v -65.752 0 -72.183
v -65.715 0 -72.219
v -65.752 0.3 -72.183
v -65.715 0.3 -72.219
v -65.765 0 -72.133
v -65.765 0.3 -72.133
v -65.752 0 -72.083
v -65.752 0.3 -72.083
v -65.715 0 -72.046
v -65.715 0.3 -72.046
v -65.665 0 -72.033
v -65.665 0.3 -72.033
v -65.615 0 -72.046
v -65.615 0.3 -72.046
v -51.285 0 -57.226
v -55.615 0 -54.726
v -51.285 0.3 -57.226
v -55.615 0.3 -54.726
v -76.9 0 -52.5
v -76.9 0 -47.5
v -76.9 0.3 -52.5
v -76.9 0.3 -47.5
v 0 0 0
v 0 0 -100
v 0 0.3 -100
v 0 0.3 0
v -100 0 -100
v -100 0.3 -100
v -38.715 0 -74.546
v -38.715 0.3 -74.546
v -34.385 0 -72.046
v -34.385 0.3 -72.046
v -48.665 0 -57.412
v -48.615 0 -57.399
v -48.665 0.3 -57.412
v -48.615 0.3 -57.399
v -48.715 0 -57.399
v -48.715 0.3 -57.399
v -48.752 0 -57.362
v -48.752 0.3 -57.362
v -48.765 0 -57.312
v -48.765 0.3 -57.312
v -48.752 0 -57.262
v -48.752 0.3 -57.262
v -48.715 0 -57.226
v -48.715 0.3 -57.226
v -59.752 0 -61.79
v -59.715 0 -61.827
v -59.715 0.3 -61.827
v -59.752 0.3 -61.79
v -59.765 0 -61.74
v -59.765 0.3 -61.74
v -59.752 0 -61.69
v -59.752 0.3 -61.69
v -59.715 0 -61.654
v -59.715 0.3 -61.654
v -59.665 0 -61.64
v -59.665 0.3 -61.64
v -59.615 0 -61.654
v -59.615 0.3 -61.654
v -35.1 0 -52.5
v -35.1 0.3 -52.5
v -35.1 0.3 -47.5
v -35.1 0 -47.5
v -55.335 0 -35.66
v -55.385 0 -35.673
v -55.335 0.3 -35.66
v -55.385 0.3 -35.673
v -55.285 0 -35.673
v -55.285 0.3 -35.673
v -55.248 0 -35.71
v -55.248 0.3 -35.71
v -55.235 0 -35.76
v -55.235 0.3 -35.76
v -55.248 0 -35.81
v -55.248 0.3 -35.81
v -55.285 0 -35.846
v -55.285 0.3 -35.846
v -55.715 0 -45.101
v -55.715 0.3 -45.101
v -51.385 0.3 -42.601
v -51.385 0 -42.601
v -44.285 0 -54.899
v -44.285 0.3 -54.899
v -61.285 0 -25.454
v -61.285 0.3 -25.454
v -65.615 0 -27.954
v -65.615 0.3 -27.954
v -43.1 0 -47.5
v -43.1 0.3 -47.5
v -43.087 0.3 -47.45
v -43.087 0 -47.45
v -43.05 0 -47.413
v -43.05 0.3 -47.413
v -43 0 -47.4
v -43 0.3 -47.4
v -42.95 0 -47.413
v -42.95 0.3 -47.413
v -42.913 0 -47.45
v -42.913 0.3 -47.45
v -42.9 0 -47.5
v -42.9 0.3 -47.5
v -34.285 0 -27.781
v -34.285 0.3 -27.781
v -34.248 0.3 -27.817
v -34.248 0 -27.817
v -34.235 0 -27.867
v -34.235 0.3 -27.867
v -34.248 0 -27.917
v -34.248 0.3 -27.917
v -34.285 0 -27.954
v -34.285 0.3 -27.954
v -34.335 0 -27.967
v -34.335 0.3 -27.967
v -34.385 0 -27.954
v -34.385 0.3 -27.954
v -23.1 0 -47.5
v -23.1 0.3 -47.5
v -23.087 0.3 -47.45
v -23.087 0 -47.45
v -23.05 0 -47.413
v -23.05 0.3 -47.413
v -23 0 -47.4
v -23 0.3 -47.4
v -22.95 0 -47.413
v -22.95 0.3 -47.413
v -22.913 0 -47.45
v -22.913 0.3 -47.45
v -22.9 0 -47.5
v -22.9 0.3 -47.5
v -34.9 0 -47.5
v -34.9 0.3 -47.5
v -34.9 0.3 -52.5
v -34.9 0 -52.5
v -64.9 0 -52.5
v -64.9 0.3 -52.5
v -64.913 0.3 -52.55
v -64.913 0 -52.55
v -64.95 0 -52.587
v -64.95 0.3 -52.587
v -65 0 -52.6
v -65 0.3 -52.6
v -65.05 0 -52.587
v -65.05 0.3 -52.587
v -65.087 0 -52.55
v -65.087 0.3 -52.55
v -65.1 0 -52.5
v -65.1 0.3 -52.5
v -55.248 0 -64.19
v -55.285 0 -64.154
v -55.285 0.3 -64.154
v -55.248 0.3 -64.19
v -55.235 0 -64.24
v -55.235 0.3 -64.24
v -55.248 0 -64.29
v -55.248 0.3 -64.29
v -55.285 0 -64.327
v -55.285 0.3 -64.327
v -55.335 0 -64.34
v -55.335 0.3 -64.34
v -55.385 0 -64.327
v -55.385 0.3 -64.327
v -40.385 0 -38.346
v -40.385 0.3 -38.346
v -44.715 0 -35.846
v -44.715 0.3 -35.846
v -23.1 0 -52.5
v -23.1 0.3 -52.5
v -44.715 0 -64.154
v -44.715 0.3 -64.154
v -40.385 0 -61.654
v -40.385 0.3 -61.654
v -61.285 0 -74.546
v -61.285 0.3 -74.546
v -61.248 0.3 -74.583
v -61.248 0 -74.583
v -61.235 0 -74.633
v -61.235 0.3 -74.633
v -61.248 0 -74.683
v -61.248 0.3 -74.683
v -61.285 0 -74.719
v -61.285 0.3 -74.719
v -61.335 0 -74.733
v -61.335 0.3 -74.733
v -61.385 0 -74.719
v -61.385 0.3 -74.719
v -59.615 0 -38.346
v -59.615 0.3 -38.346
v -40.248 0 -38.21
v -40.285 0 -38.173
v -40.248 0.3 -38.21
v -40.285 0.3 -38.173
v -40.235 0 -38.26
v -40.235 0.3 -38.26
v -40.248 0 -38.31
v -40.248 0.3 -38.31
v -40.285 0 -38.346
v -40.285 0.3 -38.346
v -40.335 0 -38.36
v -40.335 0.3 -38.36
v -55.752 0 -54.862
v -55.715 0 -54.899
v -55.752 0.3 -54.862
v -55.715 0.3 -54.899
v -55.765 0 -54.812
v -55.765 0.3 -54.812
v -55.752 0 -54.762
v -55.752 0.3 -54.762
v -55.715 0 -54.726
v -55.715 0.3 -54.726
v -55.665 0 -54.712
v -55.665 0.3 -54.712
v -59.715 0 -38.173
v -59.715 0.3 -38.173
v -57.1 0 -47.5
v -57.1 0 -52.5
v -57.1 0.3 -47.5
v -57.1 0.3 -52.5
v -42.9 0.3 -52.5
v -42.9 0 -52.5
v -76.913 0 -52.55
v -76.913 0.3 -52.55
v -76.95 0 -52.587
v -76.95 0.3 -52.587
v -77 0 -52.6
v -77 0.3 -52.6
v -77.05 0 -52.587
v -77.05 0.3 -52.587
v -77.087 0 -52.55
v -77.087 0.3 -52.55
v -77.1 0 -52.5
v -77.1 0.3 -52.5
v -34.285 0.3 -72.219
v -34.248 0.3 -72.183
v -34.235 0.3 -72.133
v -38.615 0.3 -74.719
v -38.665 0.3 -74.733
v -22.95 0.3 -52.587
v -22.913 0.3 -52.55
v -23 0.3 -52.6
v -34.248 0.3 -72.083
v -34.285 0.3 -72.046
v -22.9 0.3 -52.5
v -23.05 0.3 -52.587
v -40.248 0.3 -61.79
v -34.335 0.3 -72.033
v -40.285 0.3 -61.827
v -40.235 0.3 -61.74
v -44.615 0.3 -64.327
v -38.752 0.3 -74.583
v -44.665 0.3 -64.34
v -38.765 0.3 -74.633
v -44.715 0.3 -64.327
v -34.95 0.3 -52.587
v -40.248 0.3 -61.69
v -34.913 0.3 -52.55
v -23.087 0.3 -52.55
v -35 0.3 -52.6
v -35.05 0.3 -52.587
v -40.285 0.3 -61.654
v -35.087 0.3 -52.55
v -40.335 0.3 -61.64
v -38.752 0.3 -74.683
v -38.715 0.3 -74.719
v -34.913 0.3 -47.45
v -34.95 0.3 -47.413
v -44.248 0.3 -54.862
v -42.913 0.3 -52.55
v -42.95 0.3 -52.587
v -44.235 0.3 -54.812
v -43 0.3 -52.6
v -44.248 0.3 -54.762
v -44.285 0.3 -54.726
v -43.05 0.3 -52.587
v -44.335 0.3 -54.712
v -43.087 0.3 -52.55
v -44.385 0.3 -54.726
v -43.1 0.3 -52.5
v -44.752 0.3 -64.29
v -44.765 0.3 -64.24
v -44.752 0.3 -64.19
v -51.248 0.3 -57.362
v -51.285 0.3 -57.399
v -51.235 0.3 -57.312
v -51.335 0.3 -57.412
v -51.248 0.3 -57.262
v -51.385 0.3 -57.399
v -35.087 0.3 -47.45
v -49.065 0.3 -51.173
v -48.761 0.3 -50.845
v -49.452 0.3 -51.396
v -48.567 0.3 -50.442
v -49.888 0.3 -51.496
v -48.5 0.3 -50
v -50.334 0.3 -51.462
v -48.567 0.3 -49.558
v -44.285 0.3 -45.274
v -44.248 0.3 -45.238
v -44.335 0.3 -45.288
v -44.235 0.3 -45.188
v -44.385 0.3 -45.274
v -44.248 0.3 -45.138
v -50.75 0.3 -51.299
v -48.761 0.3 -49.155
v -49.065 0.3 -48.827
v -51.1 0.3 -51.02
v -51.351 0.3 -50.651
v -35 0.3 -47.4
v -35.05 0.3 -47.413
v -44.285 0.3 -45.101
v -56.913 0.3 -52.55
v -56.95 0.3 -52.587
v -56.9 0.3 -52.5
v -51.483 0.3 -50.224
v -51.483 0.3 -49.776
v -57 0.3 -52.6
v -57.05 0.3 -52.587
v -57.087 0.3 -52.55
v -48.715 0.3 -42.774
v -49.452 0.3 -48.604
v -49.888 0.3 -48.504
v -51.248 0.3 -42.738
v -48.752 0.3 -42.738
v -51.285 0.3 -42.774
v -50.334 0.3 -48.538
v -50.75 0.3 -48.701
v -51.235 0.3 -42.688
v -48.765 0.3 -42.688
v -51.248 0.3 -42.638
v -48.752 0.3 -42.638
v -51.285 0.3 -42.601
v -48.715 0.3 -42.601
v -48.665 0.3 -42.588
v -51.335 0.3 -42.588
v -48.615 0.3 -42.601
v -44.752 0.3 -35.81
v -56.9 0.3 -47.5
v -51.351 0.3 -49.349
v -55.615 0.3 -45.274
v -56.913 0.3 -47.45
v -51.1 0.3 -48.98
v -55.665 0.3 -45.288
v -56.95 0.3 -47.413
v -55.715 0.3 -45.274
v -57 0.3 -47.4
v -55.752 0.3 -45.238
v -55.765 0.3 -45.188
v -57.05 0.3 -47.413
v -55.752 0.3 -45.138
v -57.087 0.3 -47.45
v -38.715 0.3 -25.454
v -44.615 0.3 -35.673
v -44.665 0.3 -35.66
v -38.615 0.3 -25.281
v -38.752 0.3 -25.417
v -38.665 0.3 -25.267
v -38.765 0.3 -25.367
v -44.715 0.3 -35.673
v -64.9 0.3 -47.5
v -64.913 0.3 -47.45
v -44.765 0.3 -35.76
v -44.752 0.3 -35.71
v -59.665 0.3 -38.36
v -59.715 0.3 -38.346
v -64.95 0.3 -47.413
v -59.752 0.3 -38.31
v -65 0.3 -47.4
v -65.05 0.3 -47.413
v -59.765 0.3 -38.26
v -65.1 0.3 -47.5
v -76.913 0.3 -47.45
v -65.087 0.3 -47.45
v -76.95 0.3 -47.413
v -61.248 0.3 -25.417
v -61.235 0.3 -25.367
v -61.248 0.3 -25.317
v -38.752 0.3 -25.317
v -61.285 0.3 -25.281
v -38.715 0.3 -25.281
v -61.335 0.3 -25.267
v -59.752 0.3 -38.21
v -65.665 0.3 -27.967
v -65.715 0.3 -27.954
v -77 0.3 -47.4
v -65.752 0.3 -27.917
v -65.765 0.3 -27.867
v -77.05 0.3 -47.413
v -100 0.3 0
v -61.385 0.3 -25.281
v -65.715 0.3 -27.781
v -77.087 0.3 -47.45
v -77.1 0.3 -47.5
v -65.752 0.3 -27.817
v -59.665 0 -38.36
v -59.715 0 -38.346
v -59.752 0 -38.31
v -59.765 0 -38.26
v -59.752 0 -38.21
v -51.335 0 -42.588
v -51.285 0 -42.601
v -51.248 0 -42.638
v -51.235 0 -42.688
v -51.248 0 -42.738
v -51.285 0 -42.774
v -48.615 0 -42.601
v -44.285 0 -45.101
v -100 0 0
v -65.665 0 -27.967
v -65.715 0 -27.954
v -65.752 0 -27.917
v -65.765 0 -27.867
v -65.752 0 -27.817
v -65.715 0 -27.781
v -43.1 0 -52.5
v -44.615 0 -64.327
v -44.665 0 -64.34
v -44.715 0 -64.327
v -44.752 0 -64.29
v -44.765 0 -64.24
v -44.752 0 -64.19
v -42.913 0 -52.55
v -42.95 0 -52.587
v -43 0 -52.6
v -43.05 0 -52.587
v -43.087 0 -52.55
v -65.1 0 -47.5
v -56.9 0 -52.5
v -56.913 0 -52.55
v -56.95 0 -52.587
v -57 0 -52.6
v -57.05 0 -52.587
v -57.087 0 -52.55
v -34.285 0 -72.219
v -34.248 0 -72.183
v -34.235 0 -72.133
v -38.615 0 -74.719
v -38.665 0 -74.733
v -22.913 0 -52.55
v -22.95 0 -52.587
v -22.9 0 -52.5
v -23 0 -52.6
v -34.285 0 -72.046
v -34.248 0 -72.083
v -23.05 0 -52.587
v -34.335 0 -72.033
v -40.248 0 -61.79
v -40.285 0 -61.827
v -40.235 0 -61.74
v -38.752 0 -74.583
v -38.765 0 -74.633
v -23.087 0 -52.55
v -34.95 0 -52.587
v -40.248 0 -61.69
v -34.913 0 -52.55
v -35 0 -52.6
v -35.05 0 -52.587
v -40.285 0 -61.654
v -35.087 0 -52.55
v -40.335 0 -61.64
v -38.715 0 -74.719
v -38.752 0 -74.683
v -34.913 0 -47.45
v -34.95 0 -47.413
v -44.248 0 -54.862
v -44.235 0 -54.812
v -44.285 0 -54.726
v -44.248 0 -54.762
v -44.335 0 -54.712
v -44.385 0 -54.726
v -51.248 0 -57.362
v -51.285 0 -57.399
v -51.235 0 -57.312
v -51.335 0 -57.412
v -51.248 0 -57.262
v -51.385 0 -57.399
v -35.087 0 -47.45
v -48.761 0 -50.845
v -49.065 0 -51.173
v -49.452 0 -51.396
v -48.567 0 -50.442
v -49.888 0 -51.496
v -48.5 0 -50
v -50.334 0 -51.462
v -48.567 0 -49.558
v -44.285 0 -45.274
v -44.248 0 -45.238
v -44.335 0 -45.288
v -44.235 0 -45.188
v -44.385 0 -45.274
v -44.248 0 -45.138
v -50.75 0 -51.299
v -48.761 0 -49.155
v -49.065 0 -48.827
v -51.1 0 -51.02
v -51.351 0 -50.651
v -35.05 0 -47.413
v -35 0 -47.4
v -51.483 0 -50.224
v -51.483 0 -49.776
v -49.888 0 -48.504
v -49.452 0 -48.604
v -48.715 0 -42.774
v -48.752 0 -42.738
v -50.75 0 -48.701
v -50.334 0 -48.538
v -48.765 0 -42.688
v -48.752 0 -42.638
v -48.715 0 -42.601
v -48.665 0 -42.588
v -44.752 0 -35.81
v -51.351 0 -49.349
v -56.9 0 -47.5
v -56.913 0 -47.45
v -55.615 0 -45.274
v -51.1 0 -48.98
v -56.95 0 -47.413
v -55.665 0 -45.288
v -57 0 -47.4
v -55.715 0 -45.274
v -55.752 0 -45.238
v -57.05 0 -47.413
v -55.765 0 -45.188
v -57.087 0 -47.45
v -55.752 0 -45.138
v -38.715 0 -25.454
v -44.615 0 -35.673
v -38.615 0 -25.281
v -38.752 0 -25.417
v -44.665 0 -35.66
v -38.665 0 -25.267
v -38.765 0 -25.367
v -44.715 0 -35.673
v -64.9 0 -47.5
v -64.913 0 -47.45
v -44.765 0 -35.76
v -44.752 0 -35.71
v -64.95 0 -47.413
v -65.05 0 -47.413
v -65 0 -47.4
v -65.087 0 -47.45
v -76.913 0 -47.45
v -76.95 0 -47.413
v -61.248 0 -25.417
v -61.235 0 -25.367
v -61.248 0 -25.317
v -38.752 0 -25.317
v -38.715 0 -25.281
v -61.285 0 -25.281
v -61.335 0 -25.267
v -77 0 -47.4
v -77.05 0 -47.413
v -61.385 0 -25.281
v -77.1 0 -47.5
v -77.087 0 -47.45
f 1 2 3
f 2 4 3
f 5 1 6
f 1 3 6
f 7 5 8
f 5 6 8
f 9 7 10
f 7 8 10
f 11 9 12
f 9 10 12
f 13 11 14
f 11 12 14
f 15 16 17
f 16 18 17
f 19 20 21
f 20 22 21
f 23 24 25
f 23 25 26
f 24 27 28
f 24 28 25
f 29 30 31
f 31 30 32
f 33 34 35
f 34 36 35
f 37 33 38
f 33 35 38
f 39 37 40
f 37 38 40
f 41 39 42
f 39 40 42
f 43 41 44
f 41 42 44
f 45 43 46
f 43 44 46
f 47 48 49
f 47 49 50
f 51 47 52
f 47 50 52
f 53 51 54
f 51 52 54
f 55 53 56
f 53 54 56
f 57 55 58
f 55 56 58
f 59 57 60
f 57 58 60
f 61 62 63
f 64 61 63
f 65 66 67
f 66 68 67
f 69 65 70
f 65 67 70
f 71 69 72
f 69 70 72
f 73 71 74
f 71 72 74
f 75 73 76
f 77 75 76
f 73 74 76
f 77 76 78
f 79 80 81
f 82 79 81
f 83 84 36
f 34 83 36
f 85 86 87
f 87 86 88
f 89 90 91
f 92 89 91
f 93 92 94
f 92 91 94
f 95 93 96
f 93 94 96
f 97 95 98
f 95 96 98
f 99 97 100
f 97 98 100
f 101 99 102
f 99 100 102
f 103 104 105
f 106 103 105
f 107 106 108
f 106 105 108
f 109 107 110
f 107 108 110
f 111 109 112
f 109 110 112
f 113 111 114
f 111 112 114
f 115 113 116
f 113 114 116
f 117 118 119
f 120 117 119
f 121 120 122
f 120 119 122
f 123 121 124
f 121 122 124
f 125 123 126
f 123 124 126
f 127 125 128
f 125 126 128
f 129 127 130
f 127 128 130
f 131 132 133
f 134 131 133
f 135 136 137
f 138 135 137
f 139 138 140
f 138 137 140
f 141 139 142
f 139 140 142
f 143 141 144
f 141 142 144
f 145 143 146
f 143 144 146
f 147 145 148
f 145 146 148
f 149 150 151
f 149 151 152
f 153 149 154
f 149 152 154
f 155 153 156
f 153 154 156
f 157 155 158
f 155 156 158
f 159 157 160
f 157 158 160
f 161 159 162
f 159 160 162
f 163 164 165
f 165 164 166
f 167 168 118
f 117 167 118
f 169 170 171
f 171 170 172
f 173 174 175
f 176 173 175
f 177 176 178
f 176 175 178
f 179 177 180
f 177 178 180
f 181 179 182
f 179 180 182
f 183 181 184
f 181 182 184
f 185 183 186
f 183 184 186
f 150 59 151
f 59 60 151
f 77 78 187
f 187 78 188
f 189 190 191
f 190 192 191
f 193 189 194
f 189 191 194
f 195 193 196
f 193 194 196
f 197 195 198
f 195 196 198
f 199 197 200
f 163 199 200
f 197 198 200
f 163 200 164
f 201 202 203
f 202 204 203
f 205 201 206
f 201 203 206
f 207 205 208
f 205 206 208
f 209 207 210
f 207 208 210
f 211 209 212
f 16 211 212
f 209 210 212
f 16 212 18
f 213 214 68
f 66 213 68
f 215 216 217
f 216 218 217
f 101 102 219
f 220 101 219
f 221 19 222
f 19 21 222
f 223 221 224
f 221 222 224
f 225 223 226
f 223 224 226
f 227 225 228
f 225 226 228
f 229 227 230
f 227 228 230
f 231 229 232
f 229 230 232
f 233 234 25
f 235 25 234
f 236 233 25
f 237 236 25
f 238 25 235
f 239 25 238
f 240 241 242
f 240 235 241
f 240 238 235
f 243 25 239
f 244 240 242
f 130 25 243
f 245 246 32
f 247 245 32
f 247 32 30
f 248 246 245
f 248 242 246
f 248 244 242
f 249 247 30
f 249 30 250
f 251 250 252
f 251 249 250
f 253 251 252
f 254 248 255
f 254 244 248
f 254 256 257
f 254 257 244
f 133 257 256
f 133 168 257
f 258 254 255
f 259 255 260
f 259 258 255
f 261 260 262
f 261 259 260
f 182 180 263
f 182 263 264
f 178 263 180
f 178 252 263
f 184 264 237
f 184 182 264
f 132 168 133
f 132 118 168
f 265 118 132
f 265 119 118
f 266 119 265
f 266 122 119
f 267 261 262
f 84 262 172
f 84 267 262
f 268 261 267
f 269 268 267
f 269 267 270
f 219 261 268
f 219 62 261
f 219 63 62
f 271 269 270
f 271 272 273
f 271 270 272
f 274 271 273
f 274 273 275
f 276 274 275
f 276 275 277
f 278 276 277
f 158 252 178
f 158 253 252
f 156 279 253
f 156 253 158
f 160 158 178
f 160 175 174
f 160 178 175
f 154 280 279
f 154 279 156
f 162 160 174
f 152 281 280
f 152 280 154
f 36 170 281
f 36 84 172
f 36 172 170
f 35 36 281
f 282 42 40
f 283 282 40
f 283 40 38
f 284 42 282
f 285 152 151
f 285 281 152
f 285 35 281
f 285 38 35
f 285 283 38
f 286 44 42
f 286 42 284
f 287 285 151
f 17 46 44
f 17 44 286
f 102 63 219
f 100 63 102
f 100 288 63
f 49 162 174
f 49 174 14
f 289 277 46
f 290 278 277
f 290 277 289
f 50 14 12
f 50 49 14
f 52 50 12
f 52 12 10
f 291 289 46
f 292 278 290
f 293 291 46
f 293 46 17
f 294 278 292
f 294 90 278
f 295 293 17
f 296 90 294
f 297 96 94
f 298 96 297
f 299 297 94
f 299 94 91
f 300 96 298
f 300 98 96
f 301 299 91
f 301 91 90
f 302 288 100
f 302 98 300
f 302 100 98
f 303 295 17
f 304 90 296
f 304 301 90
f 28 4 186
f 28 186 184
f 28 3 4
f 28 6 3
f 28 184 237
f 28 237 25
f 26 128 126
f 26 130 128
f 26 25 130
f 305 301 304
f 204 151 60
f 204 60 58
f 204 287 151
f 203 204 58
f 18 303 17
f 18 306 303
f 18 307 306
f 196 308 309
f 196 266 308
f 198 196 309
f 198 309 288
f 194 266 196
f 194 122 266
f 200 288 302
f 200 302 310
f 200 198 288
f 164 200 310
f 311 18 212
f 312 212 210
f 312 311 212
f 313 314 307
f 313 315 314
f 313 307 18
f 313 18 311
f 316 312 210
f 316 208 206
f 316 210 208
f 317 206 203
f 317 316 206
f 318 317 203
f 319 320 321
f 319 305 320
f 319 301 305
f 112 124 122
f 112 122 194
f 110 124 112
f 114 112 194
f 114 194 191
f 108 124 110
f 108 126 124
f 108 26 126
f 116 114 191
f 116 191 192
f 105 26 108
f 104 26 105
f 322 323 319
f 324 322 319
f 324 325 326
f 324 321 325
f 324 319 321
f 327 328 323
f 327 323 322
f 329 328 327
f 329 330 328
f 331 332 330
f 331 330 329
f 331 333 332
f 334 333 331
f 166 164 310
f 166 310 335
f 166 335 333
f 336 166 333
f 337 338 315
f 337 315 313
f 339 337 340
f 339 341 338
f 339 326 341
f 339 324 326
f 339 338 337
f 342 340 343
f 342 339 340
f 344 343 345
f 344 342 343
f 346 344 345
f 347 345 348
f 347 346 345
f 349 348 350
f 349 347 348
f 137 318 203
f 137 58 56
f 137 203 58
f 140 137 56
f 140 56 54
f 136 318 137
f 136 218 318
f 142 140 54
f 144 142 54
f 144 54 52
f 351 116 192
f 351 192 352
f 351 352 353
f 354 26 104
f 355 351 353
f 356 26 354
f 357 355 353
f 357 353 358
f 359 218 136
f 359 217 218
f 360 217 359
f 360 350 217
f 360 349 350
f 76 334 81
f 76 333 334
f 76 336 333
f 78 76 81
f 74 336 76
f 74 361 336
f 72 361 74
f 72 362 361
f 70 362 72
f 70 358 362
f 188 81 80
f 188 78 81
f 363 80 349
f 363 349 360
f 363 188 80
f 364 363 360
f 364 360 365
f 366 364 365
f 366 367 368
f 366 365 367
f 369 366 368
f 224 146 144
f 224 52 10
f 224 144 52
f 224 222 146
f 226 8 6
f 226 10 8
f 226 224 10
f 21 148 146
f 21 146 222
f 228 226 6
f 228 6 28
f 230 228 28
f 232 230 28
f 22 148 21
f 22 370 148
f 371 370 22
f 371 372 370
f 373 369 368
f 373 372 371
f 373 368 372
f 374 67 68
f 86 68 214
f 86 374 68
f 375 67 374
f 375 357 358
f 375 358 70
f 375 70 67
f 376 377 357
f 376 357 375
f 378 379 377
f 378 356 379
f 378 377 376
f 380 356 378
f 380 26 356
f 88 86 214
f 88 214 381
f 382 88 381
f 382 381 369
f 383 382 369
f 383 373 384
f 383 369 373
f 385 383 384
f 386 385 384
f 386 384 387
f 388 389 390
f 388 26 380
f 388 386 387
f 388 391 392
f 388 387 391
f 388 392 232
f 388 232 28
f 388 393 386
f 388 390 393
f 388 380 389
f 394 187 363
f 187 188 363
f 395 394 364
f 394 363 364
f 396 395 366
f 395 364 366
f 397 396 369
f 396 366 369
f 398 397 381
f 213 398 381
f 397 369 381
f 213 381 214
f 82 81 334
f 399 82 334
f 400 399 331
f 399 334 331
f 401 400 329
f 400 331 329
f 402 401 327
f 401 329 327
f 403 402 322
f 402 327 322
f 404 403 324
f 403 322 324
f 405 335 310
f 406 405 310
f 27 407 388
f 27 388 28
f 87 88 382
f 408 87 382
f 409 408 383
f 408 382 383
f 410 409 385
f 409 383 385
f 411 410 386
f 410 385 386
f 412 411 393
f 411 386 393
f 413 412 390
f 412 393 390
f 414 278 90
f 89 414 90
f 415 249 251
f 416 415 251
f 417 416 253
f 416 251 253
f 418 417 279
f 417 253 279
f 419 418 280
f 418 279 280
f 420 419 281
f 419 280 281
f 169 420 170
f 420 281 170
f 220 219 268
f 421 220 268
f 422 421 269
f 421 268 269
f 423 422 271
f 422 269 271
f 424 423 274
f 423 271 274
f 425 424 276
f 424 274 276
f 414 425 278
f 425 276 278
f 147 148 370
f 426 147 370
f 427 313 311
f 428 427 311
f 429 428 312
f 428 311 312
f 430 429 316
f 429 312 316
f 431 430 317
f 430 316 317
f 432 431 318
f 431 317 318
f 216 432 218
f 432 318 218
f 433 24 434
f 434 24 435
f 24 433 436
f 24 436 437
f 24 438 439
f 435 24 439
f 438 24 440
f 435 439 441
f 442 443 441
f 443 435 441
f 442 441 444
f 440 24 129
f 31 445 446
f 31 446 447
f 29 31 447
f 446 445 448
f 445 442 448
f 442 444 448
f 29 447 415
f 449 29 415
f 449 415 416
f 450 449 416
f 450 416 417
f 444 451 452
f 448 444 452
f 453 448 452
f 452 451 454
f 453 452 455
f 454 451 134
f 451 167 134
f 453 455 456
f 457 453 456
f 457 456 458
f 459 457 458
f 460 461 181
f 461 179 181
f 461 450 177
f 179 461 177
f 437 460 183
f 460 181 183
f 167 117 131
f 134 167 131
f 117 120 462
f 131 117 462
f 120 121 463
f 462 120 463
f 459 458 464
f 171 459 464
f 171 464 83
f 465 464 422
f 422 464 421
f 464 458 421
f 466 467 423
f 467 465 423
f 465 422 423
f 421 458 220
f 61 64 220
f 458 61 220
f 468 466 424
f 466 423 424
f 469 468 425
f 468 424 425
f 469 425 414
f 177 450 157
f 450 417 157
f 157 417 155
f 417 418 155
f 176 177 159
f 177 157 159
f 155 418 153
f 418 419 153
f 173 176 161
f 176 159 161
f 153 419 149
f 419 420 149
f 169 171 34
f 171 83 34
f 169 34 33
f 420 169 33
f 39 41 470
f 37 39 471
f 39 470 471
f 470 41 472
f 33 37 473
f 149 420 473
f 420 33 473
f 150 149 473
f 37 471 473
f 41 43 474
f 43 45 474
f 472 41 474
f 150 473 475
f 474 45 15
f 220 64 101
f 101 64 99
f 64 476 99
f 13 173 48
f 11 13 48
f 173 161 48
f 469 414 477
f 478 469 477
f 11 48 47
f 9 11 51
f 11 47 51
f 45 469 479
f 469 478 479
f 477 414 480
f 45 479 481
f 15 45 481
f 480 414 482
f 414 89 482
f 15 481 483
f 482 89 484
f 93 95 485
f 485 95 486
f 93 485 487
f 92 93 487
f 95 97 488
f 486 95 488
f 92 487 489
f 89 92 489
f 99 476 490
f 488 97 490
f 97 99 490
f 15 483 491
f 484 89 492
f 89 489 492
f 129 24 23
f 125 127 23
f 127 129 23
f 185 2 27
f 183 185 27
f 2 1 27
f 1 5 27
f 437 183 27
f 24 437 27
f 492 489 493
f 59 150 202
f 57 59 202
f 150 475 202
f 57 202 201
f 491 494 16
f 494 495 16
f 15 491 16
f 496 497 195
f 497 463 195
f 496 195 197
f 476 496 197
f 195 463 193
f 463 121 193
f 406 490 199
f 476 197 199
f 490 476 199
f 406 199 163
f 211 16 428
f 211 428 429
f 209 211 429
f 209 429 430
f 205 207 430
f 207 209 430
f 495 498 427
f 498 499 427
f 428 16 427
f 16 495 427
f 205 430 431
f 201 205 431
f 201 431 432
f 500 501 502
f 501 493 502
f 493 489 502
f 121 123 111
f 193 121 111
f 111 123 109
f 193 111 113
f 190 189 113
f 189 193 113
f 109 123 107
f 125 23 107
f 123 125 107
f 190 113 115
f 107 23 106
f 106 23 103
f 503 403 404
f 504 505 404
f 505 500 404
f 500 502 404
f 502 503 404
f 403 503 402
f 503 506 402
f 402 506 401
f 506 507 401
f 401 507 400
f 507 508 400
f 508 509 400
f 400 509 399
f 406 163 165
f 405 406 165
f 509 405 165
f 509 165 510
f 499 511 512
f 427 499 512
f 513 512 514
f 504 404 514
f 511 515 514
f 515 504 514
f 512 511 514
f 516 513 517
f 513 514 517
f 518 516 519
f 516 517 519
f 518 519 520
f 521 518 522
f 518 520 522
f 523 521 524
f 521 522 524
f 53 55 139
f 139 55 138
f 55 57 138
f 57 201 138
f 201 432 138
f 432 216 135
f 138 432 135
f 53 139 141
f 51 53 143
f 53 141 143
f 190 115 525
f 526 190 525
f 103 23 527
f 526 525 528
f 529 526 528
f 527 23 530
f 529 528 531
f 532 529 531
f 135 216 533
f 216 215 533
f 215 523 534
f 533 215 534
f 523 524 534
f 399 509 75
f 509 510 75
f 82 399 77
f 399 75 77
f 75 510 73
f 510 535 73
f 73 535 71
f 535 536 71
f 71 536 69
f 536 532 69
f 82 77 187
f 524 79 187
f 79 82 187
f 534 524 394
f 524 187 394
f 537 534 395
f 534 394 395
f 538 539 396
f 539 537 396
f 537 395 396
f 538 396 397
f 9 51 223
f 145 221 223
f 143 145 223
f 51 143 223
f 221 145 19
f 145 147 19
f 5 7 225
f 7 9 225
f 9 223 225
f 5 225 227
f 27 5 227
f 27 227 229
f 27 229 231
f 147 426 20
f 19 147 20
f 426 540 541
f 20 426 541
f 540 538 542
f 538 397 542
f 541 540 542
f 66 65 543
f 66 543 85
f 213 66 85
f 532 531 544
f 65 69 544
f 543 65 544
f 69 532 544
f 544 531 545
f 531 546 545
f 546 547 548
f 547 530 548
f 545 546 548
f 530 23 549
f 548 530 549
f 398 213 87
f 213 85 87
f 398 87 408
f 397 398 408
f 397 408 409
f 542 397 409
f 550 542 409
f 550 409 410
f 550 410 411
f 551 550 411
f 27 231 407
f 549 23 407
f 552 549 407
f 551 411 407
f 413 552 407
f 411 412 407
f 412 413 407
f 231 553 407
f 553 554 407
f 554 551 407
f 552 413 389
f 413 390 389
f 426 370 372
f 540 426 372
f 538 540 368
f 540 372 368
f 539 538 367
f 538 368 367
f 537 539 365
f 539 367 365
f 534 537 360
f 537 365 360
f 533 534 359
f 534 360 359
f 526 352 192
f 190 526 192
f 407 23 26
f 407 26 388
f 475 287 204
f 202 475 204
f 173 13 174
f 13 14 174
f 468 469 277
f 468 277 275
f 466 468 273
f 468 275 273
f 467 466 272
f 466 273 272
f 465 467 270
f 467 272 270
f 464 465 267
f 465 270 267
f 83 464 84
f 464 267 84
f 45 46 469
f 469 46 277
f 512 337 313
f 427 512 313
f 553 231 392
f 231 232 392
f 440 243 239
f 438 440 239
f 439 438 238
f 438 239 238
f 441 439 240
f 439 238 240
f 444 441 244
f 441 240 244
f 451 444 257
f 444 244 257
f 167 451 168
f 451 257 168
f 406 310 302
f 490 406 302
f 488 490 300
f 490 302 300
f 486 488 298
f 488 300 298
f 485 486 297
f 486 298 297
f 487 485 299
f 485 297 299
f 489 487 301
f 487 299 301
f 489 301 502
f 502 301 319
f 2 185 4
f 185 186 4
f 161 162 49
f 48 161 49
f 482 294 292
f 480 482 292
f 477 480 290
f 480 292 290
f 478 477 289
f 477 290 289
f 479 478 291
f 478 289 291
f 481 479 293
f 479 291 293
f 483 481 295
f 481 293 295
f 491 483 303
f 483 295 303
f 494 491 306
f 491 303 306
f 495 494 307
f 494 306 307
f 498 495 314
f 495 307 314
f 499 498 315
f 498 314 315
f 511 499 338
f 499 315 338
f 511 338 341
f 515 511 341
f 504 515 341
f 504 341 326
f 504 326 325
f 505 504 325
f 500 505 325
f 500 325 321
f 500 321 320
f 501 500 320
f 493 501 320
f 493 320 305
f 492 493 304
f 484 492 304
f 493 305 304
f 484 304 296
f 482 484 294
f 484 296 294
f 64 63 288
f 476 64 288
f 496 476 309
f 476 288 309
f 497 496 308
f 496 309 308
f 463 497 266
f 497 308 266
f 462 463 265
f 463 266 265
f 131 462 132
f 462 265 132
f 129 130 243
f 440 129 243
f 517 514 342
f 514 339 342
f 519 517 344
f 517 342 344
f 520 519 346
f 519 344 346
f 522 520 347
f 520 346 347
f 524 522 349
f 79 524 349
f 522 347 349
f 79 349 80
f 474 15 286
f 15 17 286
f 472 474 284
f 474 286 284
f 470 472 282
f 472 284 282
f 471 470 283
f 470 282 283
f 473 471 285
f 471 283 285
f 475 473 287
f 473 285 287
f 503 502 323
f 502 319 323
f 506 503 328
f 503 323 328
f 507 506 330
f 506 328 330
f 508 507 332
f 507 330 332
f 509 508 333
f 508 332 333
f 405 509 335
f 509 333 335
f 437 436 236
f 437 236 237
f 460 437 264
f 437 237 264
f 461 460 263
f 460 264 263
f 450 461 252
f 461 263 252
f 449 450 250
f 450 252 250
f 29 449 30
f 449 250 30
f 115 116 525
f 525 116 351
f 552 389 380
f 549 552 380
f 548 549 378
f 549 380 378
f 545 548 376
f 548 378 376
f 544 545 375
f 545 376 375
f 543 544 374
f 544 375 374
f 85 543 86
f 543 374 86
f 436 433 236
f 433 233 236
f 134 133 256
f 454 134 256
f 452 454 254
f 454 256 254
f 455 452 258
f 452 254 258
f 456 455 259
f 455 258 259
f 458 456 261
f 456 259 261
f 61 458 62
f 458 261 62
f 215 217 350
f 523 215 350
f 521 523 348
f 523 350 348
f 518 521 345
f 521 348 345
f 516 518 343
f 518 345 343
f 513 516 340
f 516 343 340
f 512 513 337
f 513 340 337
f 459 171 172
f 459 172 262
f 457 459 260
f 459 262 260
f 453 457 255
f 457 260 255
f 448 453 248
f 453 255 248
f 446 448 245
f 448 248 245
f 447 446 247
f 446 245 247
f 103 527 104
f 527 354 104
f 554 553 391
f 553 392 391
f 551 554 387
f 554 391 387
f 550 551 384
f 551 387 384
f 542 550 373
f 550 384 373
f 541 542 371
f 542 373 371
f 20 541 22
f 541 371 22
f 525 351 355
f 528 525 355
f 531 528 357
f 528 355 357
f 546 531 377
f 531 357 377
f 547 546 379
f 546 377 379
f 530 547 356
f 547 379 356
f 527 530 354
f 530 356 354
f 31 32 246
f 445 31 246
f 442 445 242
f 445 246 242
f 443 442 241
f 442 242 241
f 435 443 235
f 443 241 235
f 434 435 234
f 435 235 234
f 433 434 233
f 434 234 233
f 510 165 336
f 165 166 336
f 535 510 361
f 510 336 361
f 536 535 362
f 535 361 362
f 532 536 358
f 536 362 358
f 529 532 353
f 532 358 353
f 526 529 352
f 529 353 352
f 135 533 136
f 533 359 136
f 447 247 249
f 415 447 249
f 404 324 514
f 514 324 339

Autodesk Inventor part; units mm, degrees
ref_plane "YZ Plane" through (0, 0, 0) normal (1, 0, 0) x (0, 1, 0)
ref_plane "XZ Plane" through (0, 0, 0) normal (0, 1, 0) x (-1, 0, 0)
ref_plane "XY Plane" through (0, 0, 0) normal (0, 0, 1) x (1, 0, 0)
sketch "Sketch1" plane through (0, 0, 0) normal (0, 1, 0) x (-1, 0, 0)
  line L0 (0, 0) -> (100, 0)
  line L1 (100, 0) -> (100, -100)
  line L2 (100, -100) -> (0, -100)
  line L3 (0, -100) -> (0, 0)
  dimension "d0" = 100
  dimension "d1" = 100
extrude "Extrusion1" add sketch "Sketch1" along normal blind 0.3
sketch "Sketch2" plane through (0, 0.3, 0) normal (0, 1, 0) x (1, 0, 0)
  line L0 (-100, 100) -> (-100, 0) projected
  line L1 (-100, 0) -> (0, 0) projected
  line L2 (0, 0) -> (0, 100) projected
  line L3 (0, 100) -> (-100, 100) projected
  line L4 (0, 0) -> (0, 50)
  line L5 (0, 0) -> (0, 100) projected
  line L6 (0, 50) -> (-50, 50)
  circle A0 centre (-50, 50) radius 1.5
  dimension "d4" = 50
  dimension "d5" = 3
extrude "Extrusion2" cut sketch "Sketch2" against normal blind 0.3 contours A0
sketch "Sketch3" plane through (0, 0.3, 0) normal (0, 1, 0) x (1, 0, 0)
  circle A0 centre (-50, 50) radius 1.5 projected
  line L0 (-100, 100) -> (-100, 0) projected
  line L1 (-100, 0) -> (0, 0) projected
  line L2 (0, 0) -> (0, 100) projected
  line L3 (0, 100) -> (-100, 100) projected
  line L4 (-50, 50) -> (-57, 50)
  line L5 (-57, 47.5) -> (-57, 52.5) construction
  line L6 (-56.9, 47.5) -> (-56.9, 52.5)
  line L7 (-57.1, 52.5) -> (-57.1, 47.5)
  arc A1 (-57.1, 47.5) -> (-56.9, 47.5) centre (-57, 47.5) ccw
  arc A2 (-56.9, 52.5) -> (-57.1, 52.5) centre (-57, 52.5) ccw
  line L8 (-57, 50) -> (-65, 50)
  line L9 (-65, 47.5) -> (-65, 52.5) construction
  line L10 (-64.9, 47.5) -> (-64.9, 52.5)
  line L11 (-65.1, 52.5) -> (-65.1, 47.5)
  arc A3 (-65.1, 47.5) -> (-64.9, 47.5) centre (-65, 47.5) ccw
  arc A4 (-64.9, 52.5) -> (-65.1, 52.5) centre (-65, 52.5) ccw
  line L12 (-65, 50) -> (-77, 50)
  line L13 (-77, 47.5) -> (-77, 52.5) construction
  line L14 (-76.9, 47.5) -> (-76.9, 52.5)
  line L15 (-77.1, 52.5) -> (-77.1, 47.5)
  arc A5 (-77.1, 47.5) -> (-76.9, 47.5) centre (-77, 47.5) ccw
  arc A6 (-76.9, 52.5) -> (-77.1, 52.5) centre (-77, 52.5) ccw
  dimension "d8" = 7
  dimension "d9" = 2.5
  dimension "d10" = 0.2
  dimension "d11" = 8
  dimension "d12" = 2.5
  dimension "d13" = 0.2
  dimension "d14" = 12
  dimension "d15" = 2.5
  dimension "d16" = 0.2
extrude "Extrusion3" cut sketch "Sketch3" against normal blind 0.3 contours L14 A5 L15 A6 | L10 A3 L11 L12 L8 | L8 L12 L11 A4 L10 | L6 A1 L7 L8 L4 | L4 L8 L7 A2 L6
pattern_circular "Circular Pattern1" count 6 over 360 about axis through (-50, 0.3, -50) along (0, -1, 0) of "Extrusion3"
sketch "Sketch4" plane through (0, 0.3, 0) normal (0, 1, 0) x (1, 0, 0)
  line L0 (-51.3849, 42.6012) -> (-55.7151, 45.1012) projected
  arc A0 (-55.6151, 45.2744) -> (-55.7151, 45.1012) centre (-55.6651, 45.1878) ccw projected
  line L1 (-55.6151, 45.2744) -> (-51.2849, 42.7744) projected
  arc A1 (-51.3849, 42.6012) -> (-51.2849, 42.7744) centre (-51.3349, 42.6878) ccw projected
  line L2 (-55.3849, 35.673) -> (-59.7151, 38.173) projected
  arc A2 (-59.6151, 38.3462) -> (-59.7151, 38.173) centre (-59.6651, 38.2596) ccw projected
  line L3 (-59.6151, 38.3462) -> (-55.2849, 35.8462) projected
  arc A3 (-55.3849, 35.673) -> (-55.2849, 35.8462) centre (-55.3349, 35.7596) ccw projected
  arc A4 (-65.6151, 27.9539) -> (-65.7151, 27.7807) centre (-65.6651, 27.8673) ccw projected
  line L4 (-65.6151, 27.9539) -> (-61.2849, 25.4539) projected
  arc A5 (-61.3849, 25.2807) -> (-61.2849, 25.4539) centre (-61.3349, 25.3673) ccw projected
  line L5 (-61.3849, 25.2807) -> (-65.7151, 27.7807) projected
  line L6 (-44.2849, 45.1012) -> (-48.6151, 42.6012) projected
  arc A6 (-48.7151, 42.7744) -> (-48.6151, 42.6012) centre (-48.6651, 42.6878) ccw projected
  line L7 (-48.7151, 42.7744) -> (-44.3849, 45.2744) projected
  arc A7 (-44.2849, 45.1012) -> (-44.3849, 45.2744) centre (-44.3349, 45.1878) ccw projected
  line L8 (-40.2849, 38.173) -> (-44.6151, 35.673) projected
  arc A8 (-44.7151, 35.8462) -> (-44.6151, 35.673) centre (-44.6651, 35.7596) ccw projected
  line L9 (-44.7151, 35.8462) -> (-40.3849, 38.3462) projected
  arc A9 (-40.2849, 38.173) -> (-40.3849, 38.3462) centre (-40.3349, 38.2596) ccw projected
  arc A10 (-38.7151, 25.4539) -> (-38.6151, 25.2807) centre (-38.6651, 25.3673) ccw projected
  line L10 (-38.7151, 25.4539) -> (-34.3849, 27.9539) projected
  arc A11 (-34.2849, 27.7807) -> (-34.3849, 27.9539) centre (-34.3349, 27.8673) ccw projected
  line L11 (-34.2849, 27.7807) -> (-38.6151, 25.2807) projected
  line L12 (-42.9, 52.5) -> (-42.9, 47.5) projected
  arc A12 (-43.1, 47.5) -> (-42.9, 47.5) centre (-43, 47.5) ccw projected
  line L13 (-43.1, 47.5) -> (-43.1, 52.5) projected
  arc A13 (-42.9, 52.5) -> (-43.1, 52.5) centre (-43, 52.5) ccw projected
  line L14 (-34.9, 52.5) -> (-34.9, 47.5) projected
  arc A14 (-35.1, 47.5) -> (-34.9, 47.5) centre (-35, 47.5) ccw projected
  line L15 (-35.1, 47.5) -> (-35.1, 52.5) projected
  arc A15 (-34.9, 52.5) -> (-35.1, 52.5) centre (-35, 52.5) ccw projected
  arc A16 (-23.1, 47.5) -> (-22.9, 47.5) centre (-23, 47.5) ccw projected
  line L16 (-23.1, 47.5) -> (-23.1, 52.5) projected
  arc A17 (-22.9, 52.5) -> (-23.1, 52.5) centre (-23, 52.5) ccw projected
  line L17 (-22.9, 52.5) -> (-22.9, 47.5) projected
  line L18 (-48.6151, 57.3988) -> (-44.2849, 54.8988) projected
  arc A18 (-44.3849, 54.7256) -> (-44.2849, 54.8988) centre (-44.3349, 54.8122) ccw projected
  line L19 (-44.3849, 54.7256) -> (-48.7151, 57.2256) projected
  arc A19 (-48.6151, 57.3988) -> (-48.7151, 57.2256) centre (-48.6651, 57.3122) ccw projected
  line L20 (-44.6151, 64.327) -> (-40.2849, 61.827) projected
  arc A20 (-40.3849, 61.6538) -> (-40.2849, 61.827) centre (-40.3349, 61.7404) ccw projected
  line L21 (-40.3849, 61.6538) -> (-44.7151, 64.1538) projected
  arc A21 (-44.6151, 64.327) -> (-44.7151, 64.1538) centre (-44.6651, 64.2404) ccw projected
  arc A22 (-34.3849, 72.0461) -> (-34.2849, 72.2193) centre (-34.3349, 72.1327) ccw projected
  line L22 (-34.3849, 72.0461) -> (-38.7151, 74.5461) projected
  arc A23 (-38.6151, 74.7193) -> (-38.7151, 74.5461) centre (-38.6651, 74.6327) ccw projected
  line L23 (-38.6151, 74.7193) -> (-34.2849, 72.2193) projected
  line L24 (-55.7151, 54.8988) -> (-51.3849, 57.3988) projected
  arc A24 (-51.2849, 57.2256) -> (-51.3849, 57.3988) centre (-51.3349, 57.3122) ccw projected
  line L25 (-51.2849, 57.2256) -> (-55.6151, 54.7256) projected
  arc A25 (-55.7151, 54.8988) -> (-55.6151, 54.7256) centre (-55.6651, 54.8122) ccw projected
  line L26 (-59.7151, 61.827) -> (-55.3849, 64.327) projected
  arc A26 (-55.2849, 64.1538) -> (-55.3849, 64.327) centre (-55.3349, 64.2404) ccw projected
  line L27 (-55.2849, 64.1538) -> (-59.6151, 61.6538) projected
  arc A27 (-59.7151, 61.827) -> (-59.6151, 61.6538) centre (-59.6651, 61.7404) ccw projected
  arc A28 (-61.2849, 74.5461) -> (-61.3849, 74.7193) centre (-61.3349, 74.6327) ccw projected
  line L28 (-61.2849, 74.5461) -> (-65.6151, 72.0461) projected
  arc A29 (-65.7151, 72.2193) -> (-65.6151, 72.0461) centre (-65.6651, 72.1327) ccw projected
  line L29 (-65.7151, 72.2193) -> (-61.3849, 74.7193) projected
  line L30 (-57.1, 47.5) -> (-57.1, 52.5) projected
  arc A30 (-56.9, 52.5) -> (-57.1, 52.5) centre (-57, 52.5) ccw projected
  line L31 (-56.9, 52.5) -> (-56.9, 47.5) projected
  arc A31 (-57.1, 47.5) -> (-56.9, 47.5) centre (-57, 47.5) ccw projected
  line L32 (-65.1, 47.5) -> (-65.1, 52.5) projected
  arc A32 (-64.9, 52.5) -> (-65.1, 52.5) centre (-65, 52.5) ccw projected
  line L33 (-64.9, 52.5) -> (-64.9, 47.5) projected
  arc A33 (-65.1, 47.5) -> (-64.9, 47.5) centre (-65, 47.5) ccw projected
  arc A34 (-76.9, 52.5) -> (-77.1, 52.5) centre (-77, 52.5) ccw projected
  line L34 (-76.9, 52.5) -> (-76.9, 47.5) projected
  arc A35 (-77.1, 47.5) -> (-76.9, 47.5) centre (-77, 47.5) ccw projected
  line L35 (-77.1, 47.5) -> (-77.1, 52.5) projected
  circle A36 centre (-50, 50) radius 1.5 projected
  line L36 (0, 0) -> (0, 100) projected
  line L37 (0, 100) -> (-100, 100) projected
  line L38 (-100, 100) -> (-100, 0) projected
  line L39 (-100, 0) -> (0, 0) projected
  line L40 (-76.9, 47.5) -> (-76.9, 52.5) projected
  line L41 (-76.9, 50) -> (-77, 50)
  line L42 (-76.9, 52.5) -> (-76.9, 47.5) projected
  line L43 (-77, 50) -> (-82, 50)
  line L44 (-87, 48) -> (-87, 52)
  line L45 (-87, 52) -> (-77, 52)
  line L46 (-77, 52) -> (-77, 48)
  line L47 (-77, 48) -> (-87, 48)
  line L48 (-87, 48) -> (-77, 52) construction
  line L49 (-87, 52) -> (-77, 48) construction
  circle A37 centre (-82, 50) radius 0.6
  line L50 (-82, 50) -> (-85.5, 50)
  circle A38 centre (-85.5, 50) radius 0.6
  circle A39 centre (-50, 50) radius 1.5 projected
  line L51 (-50, 50) -> (-77, 50)
  circle A40 centre (-50, 50) radius 6
  line L52 (-50, 50) -> (-63.5, 50)
  line L53 (-50, 48) -> (-50, 52)
  line L54 (-50, 52) -> (-77, 52)
  line L55 (-77, 52) -> (-77, 48)
  line L56 (-77, 48) -> (-50, 48)
  line L57 (-50, 48) -> (-77, 52) construction
  line L58 (-50, 52) -> (-77, 48) construction
  dimension "d22" = 0.1
  dimension "d23" = 5
  dimension "d24" = 4
  dimension "d25" = 10
  dimension "d26" = 1.2
  dimension "d27" = 3.5
  dimension "d28" = 1.2
  dimension "d29" = 12
  dimension "d30" = 13.5
  dimension "d31" = 4
  dimension "d32" = 27
properties part number "layer_1"
